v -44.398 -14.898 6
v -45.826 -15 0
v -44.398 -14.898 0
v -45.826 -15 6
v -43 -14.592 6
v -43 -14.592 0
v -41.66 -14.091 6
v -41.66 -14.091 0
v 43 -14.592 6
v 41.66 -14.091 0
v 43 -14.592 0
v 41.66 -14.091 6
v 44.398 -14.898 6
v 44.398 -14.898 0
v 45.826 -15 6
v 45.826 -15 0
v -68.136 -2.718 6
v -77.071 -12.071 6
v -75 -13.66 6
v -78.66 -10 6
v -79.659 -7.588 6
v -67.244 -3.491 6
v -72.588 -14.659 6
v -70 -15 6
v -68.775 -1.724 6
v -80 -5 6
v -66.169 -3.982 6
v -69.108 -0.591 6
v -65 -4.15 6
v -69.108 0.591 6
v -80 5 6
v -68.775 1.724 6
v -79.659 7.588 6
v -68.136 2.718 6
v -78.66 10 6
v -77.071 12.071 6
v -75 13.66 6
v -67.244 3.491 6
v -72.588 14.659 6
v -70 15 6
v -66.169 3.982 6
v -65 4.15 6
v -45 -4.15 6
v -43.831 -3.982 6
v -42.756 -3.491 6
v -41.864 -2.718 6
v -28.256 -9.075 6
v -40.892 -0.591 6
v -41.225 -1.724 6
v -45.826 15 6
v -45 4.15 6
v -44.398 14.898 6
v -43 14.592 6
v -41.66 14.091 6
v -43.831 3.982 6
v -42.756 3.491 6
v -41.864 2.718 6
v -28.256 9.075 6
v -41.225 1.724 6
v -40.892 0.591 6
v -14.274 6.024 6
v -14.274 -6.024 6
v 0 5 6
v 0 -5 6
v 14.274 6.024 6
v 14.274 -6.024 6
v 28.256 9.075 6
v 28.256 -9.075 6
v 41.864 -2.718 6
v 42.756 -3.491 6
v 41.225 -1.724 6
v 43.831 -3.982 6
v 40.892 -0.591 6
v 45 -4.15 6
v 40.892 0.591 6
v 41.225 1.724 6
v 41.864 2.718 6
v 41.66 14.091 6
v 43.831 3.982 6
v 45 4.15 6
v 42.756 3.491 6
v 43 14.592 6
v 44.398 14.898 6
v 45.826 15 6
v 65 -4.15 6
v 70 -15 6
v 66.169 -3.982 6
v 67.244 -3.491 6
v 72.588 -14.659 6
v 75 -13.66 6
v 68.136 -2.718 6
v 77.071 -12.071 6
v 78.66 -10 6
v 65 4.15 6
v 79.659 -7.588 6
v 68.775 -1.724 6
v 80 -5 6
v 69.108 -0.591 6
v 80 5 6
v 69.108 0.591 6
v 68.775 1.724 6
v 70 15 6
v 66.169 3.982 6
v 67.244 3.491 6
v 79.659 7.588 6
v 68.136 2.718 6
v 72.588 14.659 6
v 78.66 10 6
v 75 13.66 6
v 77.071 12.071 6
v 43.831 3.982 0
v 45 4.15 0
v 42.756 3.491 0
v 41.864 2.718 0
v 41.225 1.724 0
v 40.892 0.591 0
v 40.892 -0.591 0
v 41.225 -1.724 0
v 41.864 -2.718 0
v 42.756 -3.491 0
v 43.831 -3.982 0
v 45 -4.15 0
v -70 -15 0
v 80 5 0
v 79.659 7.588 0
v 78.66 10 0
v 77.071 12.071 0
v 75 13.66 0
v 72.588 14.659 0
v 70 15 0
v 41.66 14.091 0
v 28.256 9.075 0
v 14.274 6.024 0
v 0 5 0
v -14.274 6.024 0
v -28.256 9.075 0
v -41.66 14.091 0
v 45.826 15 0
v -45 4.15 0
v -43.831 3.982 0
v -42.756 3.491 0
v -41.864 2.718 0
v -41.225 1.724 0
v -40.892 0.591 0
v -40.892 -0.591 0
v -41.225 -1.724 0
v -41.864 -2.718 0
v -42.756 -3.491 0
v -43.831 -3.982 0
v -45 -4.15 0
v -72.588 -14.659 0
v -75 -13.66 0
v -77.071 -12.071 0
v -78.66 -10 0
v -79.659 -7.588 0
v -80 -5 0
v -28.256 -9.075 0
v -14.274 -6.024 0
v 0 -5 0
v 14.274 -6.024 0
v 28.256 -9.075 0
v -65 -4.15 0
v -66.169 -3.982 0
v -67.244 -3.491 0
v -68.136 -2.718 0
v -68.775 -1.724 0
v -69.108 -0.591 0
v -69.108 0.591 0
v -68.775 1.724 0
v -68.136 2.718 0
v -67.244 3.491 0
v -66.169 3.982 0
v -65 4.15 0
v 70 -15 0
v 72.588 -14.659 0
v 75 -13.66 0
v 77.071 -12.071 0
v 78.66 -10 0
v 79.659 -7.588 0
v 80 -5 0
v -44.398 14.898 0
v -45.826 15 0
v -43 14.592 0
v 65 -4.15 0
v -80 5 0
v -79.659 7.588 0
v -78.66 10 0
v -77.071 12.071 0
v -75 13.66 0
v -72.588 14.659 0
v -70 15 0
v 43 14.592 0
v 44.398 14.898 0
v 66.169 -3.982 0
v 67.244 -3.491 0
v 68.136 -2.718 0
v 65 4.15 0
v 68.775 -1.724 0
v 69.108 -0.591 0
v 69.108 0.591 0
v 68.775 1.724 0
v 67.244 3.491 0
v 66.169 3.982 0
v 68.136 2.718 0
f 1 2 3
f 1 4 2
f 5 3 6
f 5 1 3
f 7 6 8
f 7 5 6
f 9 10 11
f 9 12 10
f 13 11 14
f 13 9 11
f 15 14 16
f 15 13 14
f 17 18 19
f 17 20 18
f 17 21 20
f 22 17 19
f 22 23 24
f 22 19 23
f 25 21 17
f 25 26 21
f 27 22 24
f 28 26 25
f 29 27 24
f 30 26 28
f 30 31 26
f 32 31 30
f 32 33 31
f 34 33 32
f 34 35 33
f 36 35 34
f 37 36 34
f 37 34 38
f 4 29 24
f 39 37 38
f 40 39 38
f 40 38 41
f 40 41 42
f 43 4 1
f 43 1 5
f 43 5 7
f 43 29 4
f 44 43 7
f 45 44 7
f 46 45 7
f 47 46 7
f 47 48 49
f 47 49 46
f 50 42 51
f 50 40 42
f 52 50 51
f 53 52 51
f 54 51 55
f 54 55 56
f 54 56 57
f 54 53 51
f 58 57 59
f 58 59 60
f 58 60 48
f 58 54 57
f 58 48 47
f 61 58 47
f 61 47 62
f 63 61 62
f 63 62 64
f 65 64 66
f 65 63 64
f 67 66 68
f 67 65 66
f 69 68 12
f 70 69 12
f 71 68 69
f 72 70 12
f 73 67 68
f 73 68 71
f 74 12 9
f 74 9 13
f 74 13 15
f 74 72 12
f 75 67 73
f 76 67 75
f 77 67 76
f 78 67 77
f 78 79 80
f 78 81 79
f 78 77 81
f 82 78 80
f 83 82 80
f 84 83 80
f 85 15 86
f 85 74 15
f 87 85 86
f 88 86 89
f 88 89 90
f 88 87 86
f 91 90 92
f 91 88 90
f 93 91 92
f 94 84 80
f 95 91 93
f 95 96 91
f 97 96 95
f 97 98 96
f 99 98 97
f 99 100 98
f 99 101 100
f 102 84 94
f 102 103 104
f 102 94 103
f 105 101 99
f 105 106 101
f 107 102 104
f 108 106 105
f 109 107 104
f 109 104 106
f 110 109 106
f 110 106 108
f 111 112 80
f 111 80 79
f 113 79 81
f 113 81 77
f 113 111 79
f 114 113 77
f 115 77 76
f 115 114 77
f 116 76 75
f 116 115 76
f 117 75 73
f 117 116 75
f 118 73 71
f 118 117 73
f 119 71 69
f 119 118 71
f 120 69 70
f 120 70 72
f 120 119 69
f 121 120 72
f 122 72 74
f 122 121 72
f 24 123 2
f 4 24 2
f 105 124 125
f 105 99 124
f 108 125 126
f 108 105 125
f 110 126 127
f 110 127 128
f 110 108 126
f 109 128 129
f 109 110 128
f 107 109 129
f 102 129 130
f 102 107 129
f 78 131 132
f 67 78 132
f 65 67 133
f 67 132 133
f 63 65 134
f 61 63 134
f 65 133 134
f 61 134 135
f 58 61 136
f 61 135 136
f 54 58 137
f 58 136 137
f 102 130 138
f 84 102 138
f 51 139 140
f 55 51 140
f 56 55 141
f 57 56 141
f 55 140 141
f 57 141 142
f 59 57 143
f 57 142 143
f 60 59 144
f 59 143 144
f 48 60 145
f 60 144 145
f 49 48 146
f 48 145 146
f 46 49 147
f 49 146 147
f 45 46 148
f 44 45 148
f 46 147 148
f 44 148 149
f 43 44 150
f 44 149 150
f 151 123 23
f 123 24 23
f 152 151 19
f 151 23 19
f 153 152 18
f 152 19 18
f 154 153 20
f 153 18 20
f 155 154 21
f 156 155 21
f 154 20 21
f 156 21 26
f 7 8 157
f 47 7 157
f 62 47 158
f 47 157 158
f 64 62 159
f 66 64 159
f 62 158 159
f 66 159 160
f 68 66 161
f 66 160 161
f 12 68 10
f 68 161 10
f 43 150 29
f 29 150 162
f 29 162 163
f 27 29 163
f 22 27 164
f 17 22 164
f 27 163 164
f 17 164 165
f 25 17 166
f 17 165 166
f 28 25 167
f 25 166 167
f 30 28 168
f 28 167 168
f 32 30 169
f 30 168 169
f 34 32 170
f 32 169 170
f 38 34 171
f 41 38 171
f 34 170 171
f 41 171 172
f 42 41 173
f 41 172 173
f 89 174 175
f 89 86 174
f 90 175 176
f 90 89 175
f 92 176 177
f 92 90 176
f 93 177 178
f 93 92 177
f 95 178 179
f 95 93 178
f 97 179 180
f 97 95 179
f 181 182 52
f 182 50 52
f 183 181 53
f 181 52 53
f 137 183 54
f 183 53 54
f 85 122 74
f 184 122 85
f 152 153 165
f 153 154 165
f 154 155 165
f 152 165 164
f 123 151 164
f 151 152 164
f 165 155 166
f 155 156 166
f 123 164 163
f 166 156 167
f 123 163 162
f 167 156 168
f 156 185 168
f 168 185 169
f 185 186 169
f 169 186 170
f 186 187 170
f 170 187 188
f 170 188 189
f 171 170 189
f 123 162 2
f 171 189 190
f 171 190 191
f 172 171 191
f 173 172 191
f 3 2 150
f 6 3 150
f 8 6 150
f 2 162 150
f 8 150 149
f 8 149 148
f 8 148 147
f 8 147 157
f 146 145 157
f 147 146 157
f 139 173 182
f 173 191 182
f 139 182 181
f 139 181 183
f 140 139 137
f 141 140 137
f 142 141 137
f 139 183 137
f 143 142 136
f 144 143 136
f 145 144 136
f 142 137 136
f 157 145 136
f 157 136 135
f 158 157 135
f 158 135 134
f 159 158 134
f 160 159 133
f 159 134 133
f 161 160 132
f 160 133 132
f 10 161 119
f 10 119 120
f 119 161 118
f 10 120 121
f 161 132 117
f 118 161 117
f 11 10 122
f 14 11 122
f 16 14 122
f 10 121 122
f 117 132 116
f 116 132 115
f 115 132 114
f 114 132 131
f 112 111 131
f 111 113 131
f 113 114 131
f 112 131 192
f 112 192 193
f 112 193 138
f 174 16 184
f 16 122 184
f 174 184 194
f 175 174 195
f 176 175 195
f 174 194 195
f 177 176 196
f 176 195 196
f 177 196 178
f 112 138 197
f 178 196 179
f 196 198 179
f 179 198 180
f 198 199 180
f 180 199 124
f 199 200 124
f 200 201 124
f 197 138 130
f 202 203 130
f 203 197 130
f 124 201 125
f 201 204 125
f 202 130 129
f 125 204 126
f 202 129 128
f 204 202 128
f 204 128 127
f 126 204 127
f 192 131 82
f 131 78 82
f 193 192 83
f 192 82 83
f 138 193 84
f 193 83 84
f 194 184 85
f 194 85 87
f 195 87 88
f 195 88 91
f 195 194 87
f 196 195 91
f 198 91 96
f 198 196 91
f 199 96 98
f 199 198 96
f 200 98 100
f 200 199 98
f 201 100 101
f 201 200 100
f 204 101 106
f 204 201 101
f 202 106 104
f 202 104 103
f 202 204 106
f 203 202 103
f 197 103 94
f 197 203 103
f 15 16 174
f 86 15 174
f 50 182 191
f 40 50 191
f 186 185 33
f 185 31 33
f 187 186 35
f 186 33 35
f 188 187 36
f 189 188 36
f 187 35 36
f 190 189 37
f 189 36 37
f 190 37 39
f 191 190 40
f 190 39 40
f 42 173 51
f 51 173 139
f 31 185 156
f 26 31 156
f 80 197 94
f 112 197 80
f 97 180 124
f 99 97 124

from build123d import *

# Parameters (mm, degrees)
BOSS_EXTRUDE1_DEPTH = 6
FILLET1_R           = 10


with BuildPart() as part:
    # Sketch1 → Boss-Extrude1 (new body)
    with BuildSketch(Plane.XY):
        with BuildLine():
            Line((-80, -15), (-43.588989435, -15))
            ThreePointArc((-43.588989435, -15), (0, -5), (43.588989435, -15))
            Line((43.588989435, -15), (80, -15))
            Line((80, -15), (80, 15))
            Line((80, 15), (43.588989435, 15))
            ThreePointArc((43.588989435, 15), (0, 5), (-43.588989435, 15))
            Line((-43.588989435, 15), (-80, 15))
            Line((-80, 15), (-80, -15))
        make_face()
        with BuildLine():
            Line((-65, 4.15), (-45, 4.15))
            ThreePointArc((-45, 4.15), (-40.85, 0), (-45, -4.15))
            Line((-45, -4.15), (-65, -4.15))
            ThreePointArc((-65, -4.15), (-69.15, 0), (-65, 4.15))
        make_face(mode=Mode.SUBTRACT)
        with BuildLine():
            Line((65, 4.15), (45, 4.15))
            ThreePointArc((45, 4.15), (40.85, 0), (45, -4.15))
            Line((45, -4.15), (65, -4.15))
            ThreePointArc((65, -4.15), (69.15, 0), (65, 4.15))
        make_face(mode=Mode.SUBTRACT)
    extrude(amount=BOSS_EXTRUDE1_DEPTH)

    # Fillet1
    fillet1_edges = [part.edges().sort_by_distance(p)[0] for p in [
        (80, 15, 3),
        (80, -15, 3),
        (43.588989435, -15, 3),
        (-43.588989435, -15, 3),
        (-80, -15, 3),
        (-80, 15, 3),
        (-43.588989435, 15, 3),
        (43.588989435, 15, 3),
    ]]
    fillet(fillet1_edges, radius=FILLET1_R)


solid = part.part
